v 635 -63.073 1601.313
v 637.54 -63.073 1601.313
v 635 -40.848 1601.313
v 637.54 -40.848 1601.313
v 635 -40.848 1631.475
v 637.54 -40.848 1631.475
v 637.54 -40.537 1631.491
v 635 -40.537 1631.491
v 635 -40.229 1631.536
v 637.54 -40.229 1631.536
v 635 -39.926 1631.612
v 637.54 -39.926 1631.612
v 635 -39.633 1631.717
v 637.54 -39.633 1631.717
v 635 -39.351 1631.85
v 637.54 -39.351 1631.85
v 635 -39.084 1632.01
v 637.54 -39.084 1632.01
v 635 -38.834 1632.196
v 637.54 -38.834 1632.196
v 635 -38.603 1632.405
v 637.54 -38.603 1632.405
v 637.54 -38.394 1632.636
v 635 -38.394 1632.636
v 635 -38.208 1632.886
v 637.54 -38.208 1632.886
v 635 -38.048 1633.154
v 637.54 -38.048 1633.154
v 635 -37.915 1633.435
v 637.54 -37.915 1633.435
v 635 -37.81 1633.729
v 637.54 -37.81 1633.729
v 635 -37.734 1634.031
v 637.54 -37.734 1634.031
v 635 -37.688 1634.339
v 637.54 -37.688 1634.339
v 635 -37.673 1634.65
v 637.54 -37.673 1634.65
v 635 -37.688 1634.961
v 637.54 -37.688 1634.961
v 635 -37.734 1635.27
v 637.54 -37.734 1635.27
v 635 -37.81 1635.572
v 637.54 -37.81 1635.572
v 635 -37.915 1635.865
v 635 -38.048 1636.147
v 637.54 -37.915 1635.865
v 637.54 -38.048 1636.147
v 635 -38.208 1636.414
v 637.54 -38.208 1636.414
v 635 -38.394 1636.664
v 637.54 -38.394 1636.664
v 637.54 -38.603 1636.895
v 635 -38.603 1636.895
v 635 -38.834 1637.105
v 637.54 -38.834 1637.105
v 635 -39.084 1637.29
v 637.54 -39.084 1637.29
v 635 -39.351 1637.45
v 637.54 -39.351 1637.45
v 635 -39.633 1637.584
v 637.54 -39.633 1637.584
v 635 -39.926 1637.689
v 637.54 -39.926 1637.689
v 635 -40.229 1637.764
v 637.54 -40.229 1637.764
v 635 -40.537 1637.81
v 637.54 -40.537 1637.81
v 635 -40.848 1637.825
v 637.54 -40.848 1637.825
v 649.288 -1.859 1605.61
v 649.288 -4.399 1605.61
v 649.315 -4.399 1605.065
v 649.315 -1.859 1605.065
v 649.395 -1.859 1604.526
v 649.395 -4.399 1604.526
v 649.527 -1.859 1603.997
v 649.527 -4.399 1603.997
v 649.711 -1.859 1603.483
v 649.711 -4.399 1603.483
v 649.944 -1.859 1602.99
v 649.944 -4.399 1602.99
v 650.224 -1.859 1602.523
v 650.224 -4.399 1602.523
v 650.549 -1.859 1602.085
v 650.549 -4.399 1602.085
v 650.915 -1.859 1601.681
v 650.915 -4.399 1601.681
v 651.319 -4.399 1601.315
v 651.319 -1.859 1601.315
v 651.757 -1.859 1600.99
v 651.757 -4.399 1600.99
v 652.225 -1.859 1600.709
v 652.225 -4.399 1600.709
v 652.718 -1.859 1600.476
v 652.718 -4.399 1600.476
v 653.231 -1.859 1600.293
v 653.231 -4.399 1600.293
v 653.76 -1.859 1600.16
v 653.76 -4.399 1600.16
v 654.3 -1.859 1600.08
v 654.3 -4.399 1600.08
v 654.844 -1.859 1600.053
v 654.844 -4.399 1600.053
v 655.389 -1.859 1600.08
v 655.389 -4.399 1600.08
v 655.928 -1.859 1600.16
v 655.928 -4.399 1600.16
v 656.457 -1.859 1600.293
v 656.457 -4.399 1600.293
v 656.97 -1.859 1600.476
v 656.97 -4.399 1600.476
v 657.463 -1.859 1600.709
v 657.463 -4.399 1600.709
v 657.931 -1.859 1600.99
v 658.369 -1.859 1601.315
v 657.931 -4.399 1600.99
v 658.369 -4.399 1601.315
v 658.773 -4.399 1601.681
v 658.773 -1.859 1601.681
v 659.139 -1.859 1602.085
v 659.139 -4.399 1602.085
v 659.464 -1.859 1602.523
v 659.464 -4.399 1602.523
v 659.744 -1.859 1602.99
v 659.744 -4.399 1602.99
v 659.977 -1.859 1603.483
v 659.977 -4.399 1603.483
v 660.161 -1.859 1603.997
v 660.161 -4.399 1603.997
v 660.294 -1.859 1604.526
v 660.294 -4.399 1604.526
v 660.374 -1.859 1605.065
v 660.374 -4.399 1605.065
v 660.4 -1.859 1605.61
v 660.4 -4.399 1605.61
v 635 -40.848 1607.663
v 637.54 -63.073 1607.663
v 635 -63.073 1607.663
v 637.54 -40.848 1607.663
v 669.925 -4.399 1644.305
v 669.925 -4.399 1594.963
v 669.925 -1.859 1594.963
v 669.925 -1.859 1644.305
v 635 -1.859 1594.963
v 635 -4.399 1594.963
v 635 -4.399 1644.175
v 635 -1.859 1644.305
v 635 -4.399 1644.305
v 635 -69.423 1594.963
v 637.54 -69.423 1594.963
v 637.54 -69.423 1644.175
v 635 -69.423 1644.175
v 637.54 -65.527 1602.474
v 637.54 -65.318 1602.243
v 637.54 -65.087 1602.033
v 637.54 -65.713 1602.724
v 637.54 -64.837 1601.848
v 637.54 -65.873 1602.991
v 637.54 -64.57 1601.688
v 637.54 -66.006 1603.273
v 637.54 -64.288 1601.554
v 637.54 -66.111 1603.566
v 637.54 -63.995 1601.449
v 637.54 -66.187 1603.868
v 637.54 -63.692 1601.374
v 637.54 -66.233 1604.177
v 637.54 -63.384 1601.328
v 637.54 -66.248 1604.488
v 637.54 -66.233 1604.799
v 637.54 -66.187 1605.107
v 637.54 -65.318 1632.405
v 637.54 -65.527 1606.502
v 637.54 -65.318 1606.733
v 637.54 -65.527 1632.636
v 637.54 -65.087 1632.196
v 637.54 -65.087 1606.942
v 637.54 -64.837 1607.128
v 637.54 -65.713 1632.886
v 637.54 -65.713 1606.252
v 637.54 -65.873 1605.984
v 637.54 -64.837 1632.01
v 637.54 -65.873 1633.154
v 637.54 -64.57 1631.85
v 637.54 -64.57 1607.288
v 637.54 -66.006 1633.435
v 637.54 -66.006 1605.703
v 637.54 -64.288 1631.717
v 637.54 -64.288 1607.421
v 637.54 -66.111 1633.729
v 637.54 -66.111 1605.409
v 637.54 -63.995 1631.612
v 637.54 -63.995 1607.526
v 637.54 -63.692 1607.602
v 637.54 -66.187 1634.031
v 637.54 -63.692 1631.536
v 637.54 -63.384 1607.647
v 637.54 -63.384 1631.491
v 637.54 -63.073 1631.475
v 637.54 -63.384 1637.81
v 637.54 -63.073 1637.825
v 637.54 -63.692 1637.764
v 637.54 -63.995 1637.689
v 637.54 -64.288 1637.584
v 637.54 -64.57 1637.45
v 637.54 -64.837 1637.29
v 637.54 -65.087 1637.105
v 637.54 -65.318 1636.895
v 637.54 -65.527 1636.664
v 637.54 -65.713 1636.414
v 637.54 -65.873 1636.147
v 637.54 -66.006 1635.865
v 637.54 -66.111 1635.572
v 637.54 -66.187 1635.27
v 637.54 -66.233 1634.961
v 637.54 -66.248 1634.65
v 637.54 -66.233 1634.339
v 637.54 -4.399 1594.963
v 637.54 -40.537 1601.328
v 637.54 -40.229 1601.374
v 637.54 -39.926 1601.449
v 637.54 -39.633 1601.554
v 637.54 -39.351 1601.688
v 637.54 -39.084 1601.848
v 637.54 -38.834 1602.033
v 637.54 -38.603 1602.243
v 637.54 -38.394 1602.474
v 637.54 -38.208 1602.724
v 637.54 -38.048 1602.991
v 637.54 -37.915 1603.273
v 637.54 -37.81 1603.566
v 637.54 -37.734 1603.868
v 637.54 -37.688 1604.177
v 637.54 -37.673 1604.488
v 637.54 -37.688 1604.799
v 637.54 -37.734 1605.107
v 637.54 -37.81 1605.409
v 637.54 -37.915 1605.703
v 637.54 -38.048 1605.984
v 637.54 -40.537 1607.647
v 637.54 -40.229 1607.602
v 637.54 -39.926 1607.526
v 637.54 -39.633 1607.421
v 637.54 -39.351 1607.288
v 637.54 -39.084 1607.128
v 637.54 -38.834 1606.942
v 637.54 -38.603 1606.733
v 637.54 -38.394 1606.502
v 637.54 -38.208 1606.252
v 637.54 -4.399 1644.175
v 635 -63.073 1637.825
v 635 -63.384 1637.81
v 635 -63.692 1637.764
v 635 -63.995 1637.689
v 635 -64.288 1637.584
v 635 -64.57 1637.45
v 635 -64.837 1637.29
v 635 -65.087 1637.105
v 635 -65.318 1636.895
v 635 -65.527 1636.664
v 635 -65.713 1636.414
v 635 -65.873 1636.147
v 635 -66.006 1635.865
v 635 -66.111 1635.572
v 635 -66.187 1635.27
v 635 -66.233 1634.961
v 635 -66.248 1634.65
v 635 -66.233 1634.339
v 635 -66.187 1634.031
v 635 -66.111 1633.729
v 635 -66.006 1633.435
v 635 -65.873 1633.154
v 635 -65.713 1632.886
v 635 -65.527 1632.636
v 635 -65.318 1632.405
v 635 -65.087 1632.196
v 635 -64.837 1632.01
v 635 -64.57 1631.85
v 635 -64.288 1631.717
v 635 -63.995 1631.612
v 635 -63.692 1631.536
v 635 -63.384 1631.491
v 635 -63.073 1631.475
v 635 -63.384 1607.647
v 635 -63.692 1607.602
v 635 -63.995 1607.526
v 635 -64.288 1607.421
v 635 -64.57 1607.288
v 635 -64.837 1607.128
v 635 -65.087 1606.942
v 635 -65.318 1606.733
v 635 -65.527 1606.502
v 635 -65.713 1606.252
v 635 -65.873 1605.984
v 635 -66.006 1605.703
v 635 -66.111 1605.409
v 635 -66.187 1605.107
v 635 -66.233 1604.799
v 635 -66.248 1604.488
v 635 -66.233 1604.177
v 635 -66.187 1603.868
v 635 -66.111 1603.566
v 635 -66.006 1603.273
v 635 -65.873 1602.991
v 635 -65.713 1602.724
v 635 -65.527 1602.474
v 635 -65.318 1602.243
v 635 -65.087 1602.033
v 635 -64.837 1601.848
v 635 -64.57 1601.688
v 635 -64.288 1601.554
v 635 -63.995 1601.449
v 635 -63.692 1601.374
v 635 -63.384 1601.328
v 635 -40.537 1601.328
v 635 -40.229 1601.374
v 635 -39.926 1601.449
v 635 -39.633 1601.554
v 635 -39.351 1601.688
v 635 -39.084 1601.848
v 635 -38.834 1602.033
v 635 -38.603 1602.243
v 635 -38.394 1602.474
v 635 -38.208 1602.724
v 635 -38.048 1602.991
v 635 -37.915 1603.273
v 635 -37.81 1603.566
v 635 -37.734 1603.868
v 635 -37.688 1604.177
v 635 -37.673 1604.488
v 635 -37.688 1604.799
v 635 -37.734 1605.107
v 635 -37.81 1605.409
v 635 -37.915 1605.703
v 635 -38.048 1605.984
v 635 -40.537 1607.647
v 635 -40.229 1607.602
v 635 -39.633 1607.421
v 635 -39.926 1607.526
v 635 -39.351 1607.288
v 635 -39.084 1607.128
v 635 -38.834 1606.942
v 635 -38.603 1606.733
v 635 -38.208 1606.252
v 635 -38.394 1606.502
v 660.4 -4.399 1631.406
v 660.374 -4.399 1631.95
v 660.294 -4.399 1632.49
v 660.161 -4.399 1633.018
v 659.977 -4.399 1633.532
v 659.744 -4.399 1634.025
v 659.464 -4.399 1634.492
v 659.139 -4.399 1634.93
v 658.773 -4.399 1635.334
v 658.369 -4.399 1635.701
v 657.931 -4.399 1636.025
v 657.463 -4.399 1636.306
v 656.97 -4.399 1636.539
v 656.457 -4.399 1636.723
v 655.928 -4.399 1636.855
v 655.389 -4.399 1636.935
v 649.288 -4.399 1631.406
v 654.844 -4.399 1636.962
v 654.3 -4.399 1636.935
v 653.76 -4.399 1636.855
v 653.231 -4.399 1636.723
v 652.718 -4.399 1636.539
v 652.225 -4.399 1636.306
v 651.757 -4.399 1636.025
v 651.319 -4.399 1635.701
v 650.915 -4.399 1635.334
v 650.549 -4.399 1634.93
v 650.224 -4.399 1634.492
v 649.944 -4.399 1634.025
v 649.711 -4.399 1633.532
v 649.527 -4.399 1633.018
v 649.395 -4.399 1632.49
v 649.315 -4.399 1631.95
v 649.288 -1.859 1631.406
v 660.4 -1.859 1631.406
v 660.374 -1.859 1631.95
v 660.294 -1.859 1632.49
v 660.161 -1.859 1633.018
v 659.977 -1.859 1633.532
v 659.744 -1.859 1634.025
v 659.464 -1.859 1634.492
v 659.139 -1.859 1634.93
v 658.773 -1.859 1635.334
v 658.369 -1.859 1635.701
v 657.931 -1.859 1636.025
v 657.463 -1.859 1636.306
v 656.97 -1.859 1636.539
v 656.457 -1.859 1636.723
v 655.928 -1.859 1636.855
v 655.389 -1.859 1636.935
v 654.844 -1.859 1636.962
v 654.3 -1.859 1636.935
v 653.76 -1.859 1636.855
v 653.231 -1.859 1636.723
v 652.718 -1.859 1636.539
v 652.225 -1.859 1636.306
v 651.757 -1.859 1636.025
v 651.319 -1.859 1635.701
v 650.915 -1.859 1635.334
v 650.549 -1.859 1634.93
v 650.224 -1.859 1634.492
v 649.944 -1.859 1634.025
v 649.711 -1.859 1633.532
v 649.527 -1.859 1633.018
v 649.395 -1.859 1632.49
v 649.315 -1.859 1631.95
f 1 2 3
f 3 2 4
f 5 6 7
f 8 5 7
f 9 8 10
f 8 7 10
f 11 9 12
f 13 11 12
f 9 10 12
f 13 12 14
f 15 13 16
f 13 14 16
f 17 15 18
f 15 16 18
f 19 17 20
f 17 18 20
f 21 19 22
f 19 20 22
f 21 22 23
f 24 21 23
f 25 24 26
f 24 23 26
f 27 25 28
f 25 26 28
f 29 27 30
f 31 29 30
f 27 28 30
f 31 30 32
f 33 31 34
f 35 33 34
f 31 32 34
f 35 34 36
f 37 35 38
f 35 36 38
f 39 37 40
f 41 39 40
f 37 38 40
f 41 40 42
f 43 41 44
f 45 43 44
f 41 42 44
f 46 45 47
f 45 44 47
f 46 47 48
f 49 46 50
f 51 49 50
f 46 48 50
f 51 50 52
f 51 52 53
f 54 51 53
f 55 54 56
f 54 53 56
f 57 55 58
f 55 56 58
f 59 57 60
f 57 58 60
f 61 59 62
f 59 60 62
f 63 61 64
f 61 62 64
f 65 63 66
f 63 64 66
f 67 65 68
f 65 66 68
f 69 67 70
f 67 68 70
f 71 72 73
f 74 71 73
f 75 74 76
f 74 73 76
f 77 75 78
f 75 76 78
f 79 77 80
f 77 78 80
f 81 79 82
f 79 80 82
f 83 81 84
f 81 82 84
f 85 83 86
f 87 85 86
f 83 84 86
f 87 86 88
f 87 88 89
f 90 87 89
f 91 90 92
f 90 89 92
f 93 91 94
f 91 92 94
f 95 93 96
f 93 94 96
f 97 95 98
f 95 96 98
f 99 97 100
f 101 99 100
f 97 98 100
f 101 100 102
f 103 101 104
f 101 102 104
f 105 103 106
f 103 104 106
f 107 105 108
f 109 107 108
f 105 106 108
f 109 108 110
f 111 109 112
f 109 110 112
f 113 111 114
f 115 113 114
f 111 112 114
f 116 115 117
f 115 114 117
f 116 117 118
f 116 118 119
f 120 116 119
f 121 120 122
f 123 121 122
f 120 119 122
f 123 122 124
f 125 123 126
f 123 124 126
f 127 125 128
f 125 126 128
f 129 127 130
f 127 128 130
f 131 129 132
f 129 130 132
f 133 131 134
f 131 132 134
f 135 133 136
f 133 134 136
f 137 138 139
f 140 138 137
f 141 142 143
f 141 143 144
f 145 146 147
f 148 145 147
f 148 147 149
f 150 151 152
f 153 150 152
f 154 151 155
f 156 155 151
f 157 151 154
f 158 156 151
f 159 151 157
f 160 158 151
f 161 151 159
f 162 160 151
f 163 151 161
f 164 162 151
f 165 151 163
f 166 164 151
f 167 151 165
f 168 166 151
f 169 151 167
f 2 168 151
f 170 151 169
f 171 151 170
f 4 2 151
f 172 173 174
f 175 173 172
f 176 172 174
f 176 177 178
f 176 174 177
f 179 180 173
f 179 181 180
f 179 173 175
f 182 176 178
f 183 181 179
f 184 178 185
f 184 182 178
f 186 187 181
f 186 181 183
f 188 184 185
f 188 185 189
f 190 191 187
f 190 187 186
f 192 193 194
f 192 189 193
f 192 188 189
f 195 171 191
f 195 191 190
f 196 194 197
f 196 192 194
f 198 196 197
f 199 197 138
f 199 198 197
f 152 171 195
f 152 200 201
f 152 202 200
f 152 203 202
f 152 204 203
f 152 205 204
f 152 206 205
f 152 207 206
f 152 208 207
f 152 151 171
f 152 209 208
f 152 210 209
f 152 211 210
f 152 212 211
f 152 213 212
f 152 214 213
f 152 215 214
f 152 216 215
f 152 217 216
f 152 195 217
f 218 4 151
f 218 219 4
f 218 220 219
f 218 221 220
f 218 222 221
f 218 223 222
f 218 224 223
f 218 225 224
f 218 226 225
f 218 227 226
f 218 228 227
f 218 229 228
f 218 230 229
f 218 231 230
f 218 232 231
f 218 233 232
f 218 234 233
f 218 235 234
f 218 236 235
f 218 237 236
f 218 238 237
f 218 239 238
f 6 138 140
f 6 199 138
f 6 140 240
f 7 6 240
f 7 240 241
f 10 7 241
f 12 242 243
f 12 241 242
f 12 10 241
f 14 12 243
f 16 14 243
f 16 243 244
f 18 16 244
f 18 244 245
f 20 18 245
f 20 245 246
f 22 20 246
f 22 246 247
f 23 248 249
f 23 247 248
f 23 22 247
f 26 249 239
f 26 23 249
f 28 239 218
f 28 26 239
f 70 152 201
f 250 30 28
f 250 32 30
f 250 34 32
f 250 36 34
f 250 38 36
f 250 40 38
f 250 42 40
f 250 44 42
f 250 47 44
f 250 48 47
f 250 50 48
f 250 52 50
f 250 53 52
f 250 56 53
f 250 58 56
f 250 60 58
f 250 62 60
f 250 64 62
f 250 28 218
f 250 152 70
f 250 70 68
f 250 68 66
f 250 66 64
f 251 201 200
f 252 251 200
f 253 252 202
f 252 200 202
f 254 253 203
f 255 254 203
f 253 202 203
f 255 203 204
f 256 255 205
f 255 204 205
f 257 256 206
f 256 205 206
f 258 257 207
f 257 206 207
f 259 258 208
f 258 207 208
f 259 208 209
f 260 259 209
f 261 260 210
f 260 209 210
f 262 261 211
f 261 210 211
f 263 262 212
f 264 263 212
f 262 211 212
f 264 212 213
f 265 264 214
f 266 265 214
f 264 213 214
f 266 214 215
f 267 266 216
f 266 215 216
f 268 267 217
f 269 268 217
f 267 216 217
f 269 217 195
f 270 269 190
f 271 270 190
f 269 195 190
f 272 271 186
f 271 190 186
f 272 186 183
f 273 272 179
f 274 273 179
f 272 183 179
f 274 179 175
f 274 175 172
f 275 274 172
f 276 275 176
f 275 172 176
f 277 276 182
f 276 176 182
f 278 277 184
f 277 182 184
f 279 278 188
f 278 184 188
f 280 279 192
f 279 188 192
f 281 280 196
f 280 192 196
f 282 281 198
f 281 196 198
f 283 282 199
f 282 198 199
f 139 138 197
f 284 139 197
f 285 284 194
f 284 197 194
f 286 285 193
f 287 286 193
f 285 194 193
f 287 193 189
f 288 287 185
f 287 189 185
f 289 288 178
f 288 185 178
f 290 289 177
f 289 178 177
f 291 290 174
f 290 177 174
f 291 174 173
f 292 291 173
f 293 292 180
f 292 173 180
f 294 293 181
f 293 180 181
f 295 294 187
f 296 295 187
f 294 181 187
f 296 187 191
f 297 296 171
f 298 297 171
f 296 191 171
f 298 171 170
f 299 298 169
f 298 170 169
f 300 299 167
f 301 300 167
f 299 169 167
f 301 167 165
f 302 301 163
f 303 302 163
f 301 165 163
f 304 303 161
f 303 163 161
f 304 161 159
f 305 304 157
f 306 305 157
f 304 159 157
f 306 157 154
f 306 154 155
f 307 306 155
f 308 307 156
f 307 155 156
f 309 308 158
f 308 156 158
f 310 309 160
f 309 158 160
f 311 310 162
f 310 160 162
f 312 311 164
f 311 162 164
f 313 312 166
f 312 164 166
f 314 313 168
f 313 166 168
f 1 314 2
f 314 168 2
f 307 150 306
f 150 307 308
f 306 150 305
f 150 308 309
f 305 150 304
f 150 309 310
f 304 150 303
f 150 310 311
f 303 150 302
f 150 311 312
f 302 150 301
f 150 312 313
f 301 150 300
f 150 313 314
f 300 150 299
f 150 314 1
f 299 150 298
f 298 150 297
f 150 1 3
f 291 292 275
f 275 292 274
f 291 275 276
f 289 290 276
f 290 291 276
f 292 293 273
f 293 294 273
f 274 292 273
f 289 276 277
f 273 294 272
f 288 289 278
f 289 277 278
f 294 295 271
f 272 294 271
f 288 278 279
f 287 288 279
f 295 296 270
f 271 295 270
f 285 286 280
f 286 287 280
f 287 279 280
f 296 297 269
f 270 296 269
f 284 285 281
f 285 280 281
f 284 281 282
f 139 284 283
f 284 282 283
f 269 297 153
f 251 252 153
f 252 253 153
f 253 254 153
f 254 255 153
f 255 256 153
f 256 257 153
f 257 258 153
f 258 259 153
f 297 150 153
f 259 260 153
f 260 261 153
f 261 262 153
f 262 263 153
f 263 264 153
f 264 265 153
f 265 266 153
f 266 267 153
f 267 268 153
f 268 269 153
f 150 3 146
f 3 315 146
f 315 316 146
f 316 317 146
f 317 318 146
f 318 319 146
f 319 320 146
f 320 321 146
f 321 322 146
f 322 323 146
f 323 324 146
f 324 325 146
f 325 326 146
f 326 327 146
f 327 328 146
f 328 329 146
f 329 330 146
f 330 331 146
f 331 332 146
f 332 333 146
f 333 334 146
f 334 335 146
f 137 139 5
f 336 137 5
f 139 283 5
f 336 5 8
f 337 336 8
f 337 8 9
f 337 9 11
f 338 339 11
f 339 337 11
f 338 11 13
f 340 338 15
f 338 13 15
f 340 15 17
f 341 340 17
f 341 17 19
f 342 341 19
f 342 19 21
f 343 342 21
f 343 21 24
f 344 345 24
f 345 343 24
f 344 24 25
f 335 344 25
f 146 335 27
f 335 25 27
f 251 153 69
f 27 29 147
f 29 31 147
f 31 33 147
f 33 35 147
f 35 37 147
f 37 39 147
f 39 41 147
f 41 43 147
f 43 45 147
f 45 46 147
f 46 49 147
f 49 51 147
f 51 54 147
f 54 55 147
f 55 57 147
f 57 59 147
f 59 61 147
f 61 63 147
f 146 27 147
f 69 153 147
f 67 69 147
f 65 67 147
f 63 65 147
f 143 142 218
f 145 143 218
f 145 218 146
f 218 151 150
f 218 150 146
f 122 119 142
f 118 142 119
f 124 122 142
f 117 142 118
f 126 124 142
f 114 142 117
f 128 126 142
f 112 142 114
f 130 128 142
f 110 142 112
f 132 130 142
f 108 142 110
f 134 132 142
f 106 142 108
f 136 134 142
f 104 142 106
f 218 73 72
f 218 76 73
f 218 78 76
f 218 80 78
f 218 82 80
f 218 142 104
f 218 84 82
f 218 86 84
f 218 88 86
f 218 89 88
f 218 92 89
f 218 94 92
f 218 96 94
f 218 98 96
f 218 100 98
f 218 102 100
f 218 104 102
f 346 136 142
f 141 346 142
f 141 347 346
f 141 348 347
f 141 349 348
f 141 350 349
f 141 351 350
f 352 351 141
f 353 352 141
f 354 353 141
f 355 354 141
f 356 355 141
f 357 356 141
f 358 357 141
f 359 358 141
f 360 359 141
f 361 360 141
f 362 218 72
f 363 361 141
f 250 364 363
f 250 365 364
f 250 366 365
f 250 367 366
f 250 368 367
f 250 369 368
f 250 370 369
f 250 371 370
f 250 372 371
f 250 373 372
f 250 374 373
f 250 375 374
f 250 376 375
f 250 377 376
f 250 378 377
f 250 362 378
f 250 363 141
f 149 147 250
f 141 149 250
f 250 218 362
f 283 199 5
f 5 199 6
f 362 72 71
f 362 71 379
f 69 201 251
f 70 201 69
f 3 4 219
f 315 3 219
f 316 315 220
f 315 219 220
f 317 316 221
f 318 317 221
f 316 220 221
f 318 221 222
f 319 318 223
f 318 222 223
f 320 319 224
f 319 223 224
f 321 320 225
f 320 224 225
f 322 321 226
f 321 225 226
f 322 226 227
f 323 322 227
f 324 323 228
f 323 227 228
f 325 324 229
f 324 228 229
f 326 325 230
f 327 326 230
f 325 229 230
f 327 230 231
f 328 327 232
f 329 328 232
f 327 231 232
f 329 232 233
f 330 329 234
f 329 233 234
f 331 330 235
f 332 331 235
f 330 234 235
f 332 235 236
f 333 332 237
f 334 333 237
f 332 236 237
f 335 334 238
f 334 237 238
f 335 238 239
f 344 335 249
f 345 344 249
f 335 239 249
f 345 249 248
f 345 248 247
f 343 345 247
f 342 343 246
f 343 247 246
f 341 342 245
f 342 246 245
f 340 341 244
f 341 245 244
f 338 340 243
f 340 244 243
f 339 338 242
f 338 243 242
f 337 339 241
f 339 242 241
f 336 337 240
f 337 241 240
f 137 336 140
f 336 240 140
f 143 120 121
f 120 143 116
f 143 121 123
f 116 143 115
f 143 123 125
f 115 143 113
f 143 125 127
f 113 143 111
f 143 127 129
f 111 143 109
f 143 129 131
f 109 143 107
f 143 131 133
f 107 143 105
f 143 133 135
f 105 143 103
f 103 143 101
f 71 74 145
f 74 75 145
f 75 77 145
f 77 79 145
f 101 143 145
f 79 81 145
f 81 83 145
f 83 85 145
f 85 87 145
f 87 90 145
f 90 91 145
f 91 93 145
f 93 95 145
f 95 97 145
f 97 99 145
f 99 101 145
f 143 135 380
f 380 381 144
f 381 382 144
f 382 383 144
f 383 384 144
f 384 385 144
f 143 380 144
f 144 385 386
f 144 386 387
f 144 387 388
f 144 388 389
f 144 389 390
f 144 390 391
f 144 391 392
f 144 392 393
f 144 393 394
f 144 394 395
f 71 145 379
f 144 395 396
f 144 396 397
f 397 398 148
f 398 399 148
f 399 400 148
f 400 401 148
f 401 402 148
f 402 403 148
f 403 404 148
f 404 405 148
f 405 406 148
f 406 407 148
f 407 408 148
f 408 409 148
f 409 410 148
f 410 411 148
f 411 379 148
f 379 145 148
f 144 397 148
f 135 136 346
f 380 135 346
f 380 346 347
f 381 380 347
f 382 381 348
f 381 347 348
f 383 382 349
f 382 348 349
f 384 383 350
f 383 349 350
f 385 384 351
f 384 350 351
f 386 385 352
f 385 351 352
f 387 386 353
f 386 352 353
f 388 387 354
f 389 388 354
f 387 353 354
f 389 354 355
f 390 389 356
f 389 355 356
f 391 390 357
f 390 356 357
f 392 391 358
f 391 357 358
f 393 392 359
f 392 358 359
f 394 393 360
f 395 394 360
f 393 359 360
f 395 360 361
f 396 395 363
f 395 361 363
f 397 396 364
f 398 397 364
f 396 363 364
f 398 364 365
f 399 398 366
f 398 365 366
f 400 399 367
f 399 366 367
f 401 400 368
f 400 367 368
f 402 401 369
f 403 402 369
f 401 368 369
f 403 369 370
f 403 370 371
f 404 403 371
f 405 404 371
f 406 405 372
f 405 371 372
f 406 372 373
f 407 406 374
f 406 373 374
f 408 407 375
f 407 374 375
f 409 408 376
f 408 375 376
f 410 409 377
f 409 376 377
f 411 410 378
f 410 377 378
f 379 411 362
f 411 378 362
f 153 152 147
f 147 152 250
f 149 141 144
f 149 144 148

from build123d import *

# Parameters (mm, degrees)
SKETCH004_W  = 65.024
SKETCH004_H  = 49.2125
PAD004_DEPTH = 2.54
SKETCH005_W  = 49.341553
SKETCH005_H  = 34.925
PAD005_DEPTH = 2.54


with BuildPart() as inverterlowerbracket:
    # Sketch004 → Pad004 (new body)
    with BuildSketch(Plane.YZ):
        with Locations((-55.960957, 1378.268994)):
            Rectangle(SKETCH004_W, SKETCH004_H)
        with BuildLine():
            ThreePointArc((-82.122957, 1396.525244), (-85.297957, 1393.350244), (-82.122957, 1390.175244))
            Line((-82.122957, 1390.175244), (-59.897957, 1390.175244))
            ThreePointArc((-59.897957, 1390.175244), (-56.722957, 1393.350244), (-59.897957, 1396.525244))
            Line((-82.122957, 1396.525244), (-59.897957, 1396.525244))
        make_face(mode=Mode.SUBTRACT)
        with BuildLine():
            ThreePointArc((-82.122957, 1366.362744), (-85.297957, 1363.187744), (-82.122957, 1360.012744))
            Line((-82.122957, 1360.012744), (-59.897957, 1360.012744))
            ThreePointArc((-59.897957, 1360.012744), (-56.722957, 1363.187744), (-59.897957, 1366.362744))
            Line((-82.122957, 1366.362744), (-59.897957, 1366.362744))
        make_face(mode=Mode.SUBTRACT)
    extrude(amount=PAD004_DEPTH)

    # Sketch005 (on Face1 of Pad004) → Pad005 (join)
    with BuildSketch(Plane.ZX.offset(-23.448957)):
        with Locations((1378.334228, -14.922899)):
            Rectangle(SKETCH005_W, SKETCH005_H)
        with BuildLine():
            ThreePointArc((1364.309636, -11.747899), (1358.753386, -17.304149), (1364.309636, -22.860399))
            Line((1364.309636, -22.860399), (1390.105531, -22.860399))
            ThreePointArc((1390.105531, -22.860399), (1395.661781, -17.304149), (1390.105531, -11.747899))
            Line((1364.309636, -11.747899), (1390.105531, -11.747899))
        make_face(mode=Mode.SUBTRACT)
    extrude(amount=PAD005_DEPTH)


with BuildPart() as inverterlowerbracket_1:
    # Body003 placement: moved
    add(inverterlowerbracket.part.moved(Location((111.76, 19.05, 241.3))))


with BuildPart() as part_mirroring001:
    # Part__Mirroring001: instance of InverterLowerBracket
    add(inverterlowerbracket_1.part.mirror(Plane(origin=(0, 0, 0), x_dir=(0, -1, 0), z_dir=(1, 0, 0))))


with BuildPart() as part_mirroring001_1:
    # Part__Mirroring001 placement: moved
    add(part_mirroring001.part.moved(Location((749.3, 0, 0))))


solid = part_mirroring001_1.part
